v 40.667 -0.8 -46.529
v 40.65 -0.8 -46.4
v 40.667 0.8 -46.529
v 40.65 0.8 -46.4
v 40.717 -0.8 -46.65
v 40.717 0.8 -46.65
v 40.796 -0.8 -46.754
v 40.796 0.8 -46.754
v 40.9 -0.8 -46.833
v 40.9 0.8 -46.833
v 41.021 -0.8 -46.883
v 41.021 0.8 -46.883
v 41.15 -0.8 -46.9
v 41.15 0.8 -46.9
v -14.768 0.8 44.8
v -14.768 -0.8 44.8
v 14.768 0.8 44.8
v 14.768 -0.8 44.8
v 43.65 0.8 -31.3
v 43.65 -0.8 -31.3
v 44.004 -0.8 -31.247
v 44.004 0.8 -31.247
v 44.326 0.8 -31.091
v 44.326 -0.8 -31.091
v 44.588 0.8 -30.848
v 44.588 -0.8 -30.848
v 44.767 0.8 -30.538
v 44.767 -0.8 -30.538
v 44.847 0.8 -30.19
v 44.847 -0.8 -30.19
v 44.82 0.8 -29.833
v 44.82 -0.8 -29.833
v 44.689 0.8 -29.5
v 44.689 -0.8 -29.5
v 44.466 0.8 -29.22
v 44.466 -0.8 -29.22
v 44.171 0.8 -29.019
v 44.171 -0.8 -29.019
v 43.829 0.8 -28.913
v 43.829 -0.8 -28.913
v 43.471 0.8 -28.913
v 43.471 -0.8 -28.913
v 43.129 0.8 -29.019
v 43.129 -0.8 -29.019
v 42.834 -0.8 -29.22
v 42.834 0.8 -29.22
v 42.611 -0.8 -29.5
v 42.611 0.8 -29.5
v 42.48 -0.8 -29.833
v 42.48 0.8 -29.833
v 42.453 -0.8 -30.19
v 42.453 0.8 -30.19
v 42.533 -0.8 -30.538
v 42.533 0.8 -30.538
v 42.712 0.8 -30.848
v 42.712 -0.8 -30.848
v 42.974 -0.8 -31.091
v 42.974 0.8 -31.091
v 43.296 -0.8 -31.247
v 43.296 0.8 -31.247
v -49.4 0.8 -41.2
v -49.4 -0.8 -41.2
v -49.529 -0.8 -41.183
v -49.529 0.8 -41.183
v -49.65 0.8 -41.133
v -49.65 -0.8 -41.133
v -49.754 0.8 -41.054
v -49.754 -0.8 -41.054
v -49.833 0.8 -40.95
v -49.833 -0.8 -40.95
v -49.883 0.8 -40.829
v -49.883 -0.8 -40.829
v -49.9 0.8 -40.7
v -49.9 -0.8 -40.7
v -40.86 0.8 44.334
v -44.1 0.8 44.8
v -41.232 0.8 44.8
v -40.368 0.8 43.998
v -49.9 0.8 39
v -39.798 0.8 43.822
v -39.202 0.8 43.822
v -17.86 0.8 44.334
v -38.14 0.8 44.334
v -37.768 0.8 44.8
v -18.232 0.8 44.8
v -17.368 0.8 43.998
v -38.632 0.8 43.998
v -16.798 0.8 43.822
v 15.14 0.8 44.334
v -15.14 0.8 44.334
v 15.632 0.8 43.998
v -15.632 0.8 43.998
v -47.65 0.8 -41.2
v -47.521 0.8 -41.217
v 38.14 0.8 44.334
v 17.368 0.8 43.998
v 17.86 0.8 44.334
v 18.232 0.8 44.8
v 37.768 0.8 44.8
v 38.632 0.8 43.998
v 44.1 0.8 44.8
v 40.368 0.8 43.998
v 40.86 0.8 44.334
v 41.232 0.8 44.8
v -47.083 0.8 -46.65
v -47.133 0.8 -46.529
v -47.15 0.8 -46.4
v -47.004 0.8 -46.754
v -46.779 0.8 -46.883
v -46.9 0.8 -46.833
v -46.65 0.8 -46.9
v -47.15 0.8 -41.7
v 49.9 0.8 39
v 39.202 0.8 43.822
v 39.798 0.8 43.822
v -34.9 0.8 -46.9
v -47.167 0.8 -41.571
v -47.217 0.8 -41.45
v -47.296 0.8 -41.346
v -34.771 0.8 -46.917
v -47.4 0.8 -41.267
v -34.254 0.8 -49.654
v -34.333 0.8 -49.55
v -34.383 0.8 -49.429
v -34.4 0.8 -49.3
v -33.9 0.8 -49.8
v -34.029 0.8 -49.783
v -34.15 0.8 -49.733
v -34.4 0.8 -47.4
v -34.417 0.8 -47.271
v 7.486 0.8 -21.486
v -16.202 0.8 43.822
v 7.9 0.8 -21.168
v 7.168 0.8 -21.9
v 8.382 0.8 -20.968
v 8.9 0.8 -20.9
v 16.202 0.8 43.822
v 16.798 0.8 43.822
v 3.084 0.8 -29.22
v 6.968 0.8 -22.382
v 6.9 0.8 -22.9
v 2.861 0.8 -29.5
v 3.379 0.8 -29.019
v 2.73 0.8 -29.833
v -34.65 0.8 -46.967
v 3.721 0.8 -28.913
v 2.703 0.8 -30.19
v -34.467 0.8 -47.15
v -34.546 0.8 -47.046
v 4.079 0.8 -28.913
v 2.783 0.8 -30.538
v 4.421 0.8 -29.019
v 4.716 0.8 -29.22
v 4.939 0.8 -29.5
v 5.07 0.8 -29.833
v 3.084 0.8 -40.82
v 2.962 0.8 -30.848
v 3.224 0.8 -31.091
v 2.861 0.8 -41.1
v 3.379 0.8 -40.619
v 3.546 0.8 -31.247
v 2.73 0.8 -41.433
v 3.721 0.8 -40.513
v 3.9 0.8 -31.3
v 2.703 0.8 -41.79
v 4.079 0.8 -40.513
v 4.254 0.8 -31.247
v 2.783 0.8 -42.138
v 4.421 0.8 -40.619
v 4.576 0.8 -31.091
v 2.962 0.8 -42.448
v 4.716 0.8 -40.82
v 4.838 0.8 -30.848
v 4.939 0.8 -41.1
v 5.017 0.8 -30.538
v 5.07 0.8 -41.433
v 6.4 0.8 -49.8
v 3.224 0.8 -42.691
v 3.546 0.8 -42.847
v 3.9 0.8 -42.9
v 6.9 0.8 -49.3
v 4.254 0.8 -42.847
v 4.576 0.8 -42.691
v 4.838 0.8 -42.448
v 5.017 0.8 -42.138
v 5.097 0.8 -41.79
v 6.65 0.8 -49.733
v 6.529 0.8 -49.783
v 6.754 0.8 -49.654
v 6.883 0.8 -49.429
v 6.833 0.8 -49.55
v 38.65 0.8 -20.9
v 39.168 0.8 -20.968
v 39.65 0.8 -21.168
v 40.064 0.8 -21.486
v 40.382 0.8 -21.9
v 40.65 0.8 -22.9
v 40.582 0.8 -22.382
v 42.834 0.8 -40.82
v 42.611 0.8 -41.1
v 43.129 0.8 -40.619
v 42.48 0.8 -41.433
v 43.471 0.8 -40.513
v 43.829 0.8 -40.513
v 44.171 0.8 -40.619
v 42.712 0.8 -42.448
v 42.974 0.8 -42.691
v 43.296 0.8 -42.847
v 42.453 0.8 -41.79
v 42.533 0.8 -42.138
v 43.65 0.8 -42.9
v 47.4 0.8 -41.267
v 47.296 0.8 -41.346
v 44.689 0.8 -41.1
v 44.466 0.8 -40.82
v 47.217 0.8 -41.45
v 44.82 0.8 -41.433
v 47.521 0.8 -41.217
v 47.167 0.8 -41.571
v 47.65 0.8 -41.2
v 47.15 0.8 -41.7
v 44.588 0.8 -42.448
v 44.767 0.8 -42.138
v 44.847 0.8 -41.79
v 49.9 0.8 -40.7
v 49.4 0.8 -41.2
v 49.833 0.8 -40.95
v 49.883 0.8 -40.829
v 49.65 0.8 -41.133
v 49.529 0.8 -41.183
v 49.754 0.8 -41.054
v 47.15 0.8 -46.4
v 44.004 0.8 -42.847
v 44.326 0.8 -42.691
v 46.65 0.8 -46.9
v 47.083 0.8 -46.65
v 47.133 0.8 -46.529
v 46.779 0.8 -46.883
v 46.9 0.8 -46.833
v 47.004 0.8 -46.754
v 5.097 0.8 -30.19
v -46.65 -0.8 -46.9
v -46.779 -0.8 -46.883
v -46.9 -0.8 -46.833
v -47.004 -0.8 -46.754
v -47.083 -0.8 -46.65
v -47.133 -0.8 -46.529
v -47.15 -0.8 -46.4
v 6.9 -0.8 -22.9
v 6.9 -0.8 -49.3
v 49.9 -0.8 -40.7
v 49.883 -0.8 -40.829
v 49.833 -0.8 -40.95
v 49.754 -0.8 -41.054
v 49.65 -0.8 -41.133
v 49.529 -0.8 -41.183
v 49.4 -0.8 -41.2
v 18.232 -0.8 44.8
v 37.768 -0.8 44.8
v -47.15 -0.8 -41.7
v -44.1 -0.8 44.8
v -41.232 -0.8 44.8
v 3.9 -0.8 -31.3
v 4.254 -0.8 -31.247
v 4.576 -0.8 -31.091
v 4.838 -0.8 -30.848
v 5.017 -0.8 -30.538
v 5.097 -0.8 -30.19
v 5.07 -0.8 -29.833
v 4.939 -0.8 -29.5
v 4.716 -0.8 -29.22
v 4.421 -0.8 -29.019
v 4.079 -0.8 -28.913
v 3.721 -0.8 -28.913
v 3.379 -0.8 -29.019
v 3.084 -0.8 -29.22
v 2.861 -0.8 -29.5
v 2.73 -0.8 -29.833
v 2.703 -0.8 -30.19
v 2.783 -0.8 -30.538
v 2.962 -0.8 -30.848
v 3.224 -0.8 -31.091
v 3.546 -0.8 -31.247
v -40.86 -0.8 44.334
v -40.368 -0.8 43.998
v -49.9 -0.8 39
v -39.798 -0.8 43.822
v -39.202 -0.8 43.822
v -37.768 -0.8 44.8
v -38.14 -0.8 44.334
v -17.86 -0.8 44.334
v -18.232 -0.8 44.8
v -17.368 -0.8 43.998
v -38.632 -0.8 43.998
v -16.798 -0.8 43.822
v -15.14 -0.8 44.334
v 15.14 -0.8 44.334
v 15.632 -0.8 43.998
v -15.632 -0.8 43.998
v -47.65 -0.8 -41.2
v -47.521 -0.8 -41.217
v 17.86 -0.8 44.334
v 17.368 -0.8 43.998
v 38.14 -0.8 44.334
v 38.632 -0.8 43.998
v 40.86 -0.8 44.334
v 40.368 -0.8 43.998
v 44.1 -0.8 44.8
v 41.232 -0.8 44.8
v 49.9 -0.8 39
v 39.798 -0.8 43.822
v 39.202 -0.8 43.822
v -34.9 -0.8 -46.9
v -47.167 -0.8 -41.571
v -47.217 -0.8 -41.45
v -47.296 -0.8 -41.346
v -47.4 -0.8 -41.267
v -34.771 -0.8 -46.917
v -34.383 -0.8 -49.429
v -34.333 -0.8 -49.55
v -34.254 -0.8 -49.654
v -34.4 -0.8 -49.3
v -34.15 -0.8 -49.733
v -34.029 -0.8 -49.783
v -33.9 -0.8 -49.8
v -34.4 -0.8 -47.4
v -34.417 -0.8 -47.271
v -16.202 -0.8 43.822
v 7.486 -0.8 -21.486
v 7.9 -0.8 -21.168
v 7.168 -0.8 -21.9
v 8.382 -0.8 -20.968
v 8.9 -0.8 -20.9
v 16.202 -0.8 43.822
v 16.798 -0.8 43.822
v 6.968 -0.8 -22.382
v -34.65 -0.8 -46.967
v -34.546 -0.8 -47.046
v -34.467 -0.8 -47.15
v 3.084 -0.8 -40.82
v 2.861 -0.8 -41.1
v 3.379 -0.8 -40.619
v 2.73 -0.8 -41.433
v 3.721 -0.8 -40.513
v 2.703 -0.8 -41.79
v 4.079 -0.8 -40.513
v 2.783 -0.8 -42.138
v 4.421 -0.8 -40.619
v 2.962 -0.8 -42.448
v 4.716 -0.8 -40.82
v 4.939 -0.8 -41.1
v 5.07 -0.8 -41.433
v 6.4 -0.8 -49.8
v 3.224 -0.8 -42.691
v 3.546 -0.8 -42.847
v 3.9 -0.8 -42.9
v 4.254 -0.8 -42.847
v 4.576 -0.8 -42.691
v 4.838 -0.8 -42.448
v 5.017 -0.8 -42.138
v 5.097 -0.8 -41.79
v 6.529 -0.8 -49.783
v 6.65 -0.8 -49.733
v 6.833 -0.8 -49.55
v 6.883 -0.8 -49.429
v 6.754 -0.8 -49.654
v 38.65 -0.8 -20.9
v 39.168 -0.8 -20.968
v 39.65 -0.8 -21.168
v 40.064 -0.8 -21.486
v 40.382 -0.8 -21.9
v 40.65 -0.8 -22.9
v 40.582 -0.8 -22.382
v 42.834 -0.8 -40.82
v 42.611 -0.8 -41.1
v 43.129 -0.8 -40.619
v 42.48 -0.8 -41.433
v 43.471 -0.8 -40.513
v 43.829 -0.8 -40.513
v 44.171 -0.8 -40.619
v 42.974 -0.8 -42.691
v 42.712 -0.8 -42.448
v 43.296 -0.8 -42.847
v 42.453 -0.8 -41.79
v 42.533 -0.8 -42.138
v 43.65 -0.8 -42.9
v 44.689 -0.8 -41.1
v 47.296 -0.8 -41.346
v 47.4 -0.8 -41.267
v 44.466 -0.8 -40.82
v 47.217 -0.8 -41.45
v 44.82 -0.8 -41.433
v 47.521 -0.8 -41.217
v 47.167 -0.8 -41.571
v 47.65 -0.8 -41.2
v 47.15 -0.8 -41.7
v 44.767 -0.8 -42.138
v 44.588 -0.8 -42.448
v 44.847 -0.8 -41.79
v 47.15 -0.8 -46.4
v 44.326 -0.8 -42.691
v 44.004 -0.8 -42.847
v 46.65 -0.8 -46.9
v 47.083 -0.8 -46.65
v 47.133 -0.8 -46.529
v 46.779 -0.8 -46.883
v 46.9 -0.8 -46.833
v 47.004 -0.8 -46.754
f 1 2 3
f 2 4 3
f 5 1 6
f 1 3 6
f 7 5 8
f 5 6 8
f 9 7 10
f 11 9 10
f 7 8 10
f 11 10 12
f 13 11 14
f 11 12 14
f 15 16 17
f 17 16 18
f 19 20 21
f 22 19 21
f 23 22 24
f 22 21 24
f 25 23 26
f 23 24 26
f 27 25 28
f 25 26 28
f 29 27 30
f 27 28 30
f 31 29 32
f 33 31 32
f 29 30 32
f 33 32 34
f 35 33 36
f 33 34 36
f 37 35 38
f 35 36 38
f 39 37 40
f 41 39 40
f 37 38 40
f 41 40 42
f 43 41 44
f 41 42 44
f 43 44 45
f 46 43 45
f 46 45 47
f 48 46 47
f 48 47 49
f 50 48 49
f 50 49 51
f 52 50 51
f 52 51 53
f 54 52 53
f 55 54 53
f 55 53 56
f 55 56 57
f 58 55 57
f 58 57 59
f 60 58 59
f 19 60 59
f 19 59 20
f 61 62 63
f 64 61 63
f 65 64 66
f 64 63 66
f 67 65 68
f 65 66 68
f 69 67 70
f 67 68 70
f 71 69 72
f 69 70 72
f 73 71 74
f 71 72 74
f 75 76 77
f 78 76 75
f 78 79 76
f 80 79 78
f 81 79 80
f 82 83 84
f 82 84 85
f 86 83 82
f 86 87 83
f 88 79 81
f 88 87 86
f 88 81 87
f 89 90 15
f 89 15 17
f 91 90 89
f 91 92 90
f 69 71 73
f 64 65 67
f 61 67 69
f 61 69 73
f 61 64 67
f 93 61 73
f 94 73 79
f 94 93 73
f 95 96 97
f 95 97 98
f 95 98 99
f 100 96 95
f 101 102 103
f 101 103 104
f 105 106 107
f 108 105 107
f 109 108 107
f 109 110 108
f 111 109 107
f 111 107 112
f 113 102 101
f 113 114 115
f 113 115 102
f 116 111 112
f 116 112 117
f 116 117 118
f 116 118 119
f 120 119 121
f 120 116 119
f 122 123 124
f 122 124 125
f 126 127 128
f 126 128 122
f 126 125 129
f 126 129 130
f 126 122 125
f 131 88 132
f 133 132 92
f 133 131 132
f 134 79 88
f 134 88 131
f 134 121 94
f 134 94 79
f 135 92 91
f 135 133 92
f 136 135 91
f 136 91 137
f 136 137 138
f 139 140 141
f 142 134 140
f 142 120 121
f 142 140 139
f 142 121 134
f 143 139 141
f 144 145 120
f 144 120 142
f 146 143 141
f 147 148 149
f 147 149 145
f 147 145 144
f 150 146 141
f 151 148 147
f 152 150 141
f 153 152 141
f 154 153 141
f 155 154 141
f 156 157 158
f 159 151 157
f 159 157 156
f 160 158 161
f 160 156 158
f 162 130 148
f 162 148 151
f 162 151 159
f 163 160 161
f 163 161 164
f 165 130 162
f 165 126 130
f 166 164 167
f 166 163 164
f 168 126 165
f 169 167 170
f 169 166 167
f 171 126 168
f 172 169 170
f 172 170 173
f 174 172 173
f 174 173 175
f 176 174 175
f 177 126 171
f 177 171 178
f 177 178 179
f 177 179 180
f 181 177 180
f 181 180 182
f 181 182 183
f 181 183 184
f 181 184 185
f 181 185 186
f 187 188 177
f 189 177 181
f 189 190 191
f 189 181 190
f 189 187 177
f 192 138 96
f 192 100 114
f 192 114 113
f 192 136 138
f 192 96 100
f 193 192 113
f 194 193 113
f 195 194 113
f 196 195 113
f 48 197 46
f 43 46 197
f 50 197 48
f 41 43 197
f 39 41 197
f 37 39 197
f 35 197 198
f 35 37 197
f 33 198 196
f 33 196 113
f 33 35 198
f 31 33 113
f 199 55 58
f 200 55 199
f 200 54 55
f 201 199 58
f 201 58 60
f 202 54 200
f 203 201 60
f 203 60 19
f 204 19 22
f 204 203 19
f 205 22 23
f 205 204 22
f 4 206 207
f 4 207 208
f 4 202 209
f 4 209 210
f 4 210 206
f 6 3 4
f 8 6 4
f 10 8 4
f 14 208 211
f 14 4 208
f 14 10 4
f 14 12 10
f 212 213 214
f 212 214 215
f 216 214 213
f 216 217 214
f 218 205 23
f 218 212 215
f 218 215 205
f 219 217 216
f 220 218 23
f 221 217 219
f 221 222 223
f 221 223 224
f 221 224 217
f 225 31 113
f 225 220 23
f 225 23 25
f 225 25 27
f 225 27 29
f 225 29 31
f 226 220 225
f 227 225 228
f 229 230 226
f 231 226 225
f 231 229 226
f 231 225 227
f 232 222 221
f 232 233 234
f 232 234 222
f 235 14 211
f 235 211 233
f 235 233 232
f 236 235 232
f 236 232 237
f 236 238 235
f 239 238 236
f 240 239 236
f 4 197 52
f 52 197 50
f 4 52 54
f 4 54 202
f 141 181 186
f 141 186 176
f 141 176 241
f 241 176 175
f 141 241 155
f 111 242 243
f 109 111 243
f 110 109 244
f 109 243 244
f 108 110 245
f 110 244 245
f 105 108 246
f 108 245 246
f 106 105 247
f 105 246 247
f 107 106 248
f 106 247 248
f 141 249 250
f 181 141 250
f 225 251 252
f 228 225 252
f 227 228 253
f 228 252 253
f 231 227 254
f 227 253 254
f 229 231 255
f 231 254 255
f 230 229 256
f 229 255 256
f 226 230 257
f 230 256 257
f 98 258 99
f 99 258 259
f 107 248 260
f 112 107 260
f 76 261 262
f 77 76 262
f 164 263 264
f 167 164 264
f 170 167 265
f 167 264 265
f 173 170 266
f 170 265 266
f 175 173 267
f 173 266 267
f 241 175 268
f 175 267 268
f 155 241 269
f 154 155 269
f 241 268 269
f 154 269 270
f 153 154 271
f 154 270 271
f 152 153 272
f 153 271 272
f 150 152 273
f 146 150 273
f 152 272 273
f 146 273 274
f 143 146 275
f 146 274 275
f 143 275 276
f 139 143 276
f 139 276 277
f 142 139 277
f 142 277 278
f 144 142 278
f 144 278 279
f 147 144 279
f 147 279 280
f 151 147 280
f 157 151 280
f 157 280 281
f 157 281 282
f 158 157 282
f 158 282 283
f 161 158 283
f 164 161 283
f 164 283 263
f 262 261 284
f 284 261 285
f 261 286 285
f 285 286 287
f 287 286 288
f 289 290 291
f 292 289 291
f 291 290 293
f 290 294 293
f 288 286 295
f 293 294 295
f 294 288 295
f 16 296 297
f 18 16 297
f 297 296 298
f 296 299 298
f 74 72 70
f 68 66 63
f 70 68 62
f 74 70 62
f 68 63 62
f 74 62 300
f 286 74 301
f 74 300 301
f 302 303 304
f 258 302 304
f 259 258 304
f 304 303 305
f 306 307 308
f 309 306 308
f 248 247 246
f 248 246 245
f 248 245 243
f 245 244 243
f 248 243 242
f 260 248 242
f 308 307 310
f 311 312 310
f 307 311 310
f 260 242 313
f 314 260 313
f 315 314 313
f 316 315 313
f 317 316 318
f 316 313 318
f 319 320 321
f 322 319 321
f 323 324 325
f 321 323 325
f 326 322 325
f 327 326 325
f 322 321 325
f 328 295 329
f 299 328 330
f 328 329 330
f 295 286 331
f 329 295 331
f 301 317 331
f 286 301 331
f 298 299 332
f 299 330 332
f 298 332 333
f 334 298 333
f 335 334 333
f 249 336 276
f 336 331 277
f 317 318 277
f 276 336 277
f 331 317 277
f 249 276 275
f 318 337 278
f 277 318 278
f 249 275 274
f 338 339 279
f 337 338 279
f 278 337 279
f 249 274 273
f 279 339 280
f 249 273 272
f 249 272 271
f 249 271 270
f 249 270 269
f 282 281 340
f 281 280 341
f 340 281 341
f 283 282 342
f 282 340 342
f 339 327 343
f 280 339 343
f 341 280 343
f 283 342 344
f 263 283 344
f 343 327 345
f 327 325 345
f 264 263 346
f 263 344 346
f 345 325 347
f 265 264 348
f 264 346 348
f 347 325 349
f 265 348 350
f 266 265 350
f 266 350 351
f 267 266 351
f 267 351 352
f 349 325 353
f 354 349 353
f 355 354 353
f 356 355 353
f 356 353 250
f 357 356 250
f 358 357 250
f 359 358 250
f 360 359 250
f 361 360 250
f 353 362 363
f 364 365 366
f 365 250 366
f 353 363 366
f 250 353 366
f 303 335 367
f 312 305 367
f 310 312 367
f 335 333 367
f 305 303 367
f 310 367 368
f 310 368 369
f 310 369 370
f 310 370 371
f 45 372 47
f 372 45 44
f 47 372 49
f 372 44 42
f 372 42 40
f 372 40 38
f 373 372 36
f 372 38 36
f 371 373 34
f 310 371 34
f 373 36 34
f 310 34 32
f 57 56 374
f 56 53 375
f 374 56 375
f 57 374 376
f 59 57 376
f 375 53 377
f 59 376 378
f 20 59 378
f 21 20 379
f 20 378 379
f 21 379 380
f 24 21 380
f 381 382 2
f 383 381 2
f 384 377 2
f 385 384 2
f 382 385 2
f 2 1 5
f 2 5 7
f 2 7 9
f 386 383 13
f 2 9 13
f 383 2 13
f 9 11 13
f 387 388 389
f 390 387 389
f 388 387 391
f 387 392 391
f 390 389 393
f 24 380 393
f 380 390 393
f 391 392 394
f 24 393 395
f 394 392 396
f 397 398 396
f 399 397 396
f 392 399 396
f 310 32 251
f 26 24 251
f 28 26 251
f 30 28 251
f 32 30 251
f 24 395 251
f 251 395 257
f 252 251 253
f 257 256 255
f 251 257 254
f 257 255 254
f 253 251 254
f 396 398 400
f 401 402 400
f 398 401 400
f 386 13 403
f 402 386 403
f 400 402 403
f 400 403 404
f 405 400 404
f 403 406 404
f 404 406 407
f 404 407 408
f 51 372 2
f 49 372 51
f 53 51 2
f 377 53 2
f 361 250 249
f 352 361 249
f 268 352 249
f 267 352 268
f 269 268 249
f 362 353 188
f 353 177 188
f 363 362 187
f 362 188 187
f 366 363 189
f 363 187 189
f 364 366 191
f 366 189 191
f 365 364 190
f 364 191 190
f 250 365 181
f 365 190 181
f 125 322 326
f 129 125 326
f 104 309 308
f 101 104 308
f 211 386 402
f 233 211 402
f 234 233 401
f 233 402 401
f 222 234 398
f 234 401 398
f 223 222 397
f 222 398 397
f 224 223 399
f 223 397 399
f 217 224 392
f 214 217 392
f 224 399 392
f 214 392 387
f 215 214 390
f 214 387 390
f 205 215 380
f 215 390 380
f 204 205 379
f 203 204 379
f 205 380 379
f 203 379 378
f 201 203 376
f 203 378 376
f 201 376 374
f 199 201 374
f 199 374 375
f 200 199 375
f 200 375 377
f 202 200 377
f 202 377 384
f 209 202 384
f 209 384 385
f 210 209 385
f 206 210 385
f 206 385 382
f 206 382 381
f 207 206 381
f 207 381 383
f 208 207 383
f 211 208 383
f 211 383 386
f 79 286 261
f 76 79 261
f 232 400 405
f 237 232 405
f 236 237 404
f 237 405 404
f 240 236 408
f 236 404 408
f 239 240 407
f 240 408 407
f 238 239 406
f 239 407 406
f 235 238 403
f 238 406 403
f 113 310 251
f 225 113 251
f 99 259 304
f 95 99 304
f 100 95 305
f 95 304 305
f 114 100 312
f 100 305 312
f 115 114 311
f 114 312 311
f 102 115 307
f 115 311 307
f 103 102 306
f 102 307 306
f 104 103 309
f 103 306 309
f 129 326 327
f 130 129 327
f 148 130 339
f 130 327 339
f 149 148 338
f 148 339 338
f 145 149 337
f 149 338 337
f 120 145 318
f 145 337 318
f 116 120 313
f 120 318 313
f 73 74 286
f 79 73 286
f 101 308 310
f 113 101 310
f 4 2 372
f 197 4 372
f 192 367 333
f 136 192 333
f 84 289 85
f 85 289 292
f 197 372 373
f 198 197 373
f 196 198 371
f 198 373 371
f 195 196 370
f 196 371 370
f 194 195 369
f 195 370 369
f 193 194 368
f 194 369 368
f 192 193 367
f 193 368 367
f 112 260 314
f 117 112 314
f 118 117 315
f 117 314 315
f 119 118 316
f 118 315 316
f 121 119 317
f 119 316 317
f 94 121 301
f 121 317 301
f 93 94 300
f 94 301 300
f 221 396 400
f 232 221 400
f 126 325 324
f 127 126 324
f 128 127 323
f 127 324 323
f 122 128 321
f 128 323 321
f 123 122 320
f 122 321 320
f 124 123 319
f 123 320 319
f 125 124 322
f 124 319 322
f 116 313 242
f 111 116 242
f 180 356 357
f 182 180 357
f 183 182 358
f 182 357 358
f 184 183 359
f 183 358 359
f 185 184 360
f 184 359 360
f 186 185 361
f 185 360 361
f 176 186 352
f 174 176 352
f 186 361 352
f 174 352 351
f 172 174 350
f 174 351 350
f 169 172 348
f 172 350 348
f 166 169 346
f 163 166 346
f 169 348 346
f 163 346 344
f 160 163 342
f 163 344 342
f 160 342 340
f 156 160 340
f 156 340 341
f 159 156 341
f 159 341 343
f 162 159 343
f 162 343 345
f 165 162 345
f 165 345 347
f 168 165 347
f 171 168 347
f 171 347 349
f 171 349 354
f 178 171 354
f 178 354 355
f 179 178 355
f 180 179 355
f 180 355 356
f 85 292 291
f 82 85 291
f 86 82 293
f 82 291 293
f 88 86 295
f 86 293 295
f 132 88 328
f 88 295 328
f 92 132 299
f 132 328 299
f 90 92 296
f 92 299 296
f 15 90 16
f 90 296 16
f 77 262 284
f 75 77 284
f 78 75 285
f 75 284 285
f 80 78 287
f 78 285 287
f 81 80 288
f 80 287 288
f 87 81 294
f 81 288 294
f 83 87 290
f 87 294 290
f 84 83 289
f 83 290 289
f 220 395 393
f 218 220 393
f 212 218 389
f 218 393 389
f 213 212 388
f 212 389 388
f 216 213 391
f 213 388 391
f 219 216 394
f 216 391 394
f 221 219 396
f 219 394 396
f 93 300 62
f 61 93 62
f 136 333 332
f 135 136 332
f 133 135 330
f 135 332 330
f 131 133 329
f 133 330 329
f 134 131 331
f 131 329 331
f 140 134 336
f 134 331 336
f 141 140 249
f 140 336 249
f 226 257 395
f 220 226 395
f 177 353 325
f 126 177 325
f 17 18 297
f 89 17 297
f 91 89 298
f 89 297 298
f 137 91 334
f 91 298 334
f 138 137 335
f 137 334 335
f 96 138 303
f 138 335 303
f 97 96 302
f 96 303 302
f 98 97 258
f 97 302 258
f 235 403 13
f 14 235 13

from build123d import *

# Parameters (mm, degrees)
GENERICCARDPCBDEFINITION_START = -0.8
GENERICCARDPCBDEFINITION_DEPTH = 1.6
SKETCH7_R                      = 1.2
CUT_EXTRUDE1_DEPTH             = 71.516735602
FILLET1_R                      = 0.5


# Read off the part's stored shape, not the designer's step: GenericCardPCBDefinition
with BuildPart() as part:
    # GenericCardPCBDefinition outline → GenericCardPCBDefinition (new body)
    with BuildSketch(Plane(origin=(0, 0, 0), x_dir=(1, 0, 0), z_dir=(0, 1, 0)).offset(GENERICCARDPCBDEFINITION_START)):
        with BuildLine():
            Line((-49.9, -39), (-44.1, -44.8))
            Line((-44.1, -44.8), (-41.232050808, -44.8))
            ThreePointArc((-41.232050808, -44.8), (-39.5, -43.8), (-37.767949192, -44.8))
            Line((-37.767949192, -44.8), (-18.232050808, -44.8))
            ThreePointArc((-18.232050808, -44.8), (-16.5, -43.8), (-14.767949192, -44.8))
            Line((-14.767949192, -44.8), (14.767949192, -44.8))
            ThreePointArc((14.767949192, -44.8), (16.5, -43.8), (18.232050808, -44.8))
            Line((18.232050808, -44.8), (37.767949192, -44.8))
            ThreePointArc((37.767949192, -44.8), (39.5, -43.8), (41.232050808, -44.8))
            Line((41.232050808, -44.8), (44.1, -44.8))
            Line((44.1, -44.8), (49.9, -39))
            Line((49.9, -39), (49.9, 40.7))
            ThreePointArc((49.9, 40.7), (49.753553391, 41.053553391), (49.4, 41.2))
            Line((49.4, 41.2), (47.65, 41.2))
            ThreePointArc((47.65, 41.2), (47.296446609, 41.346446609), (47.15, 41.7))
            Line((47.15, 41.7), (47.15, 46.4))
            ThreePointArc((47.15, 46.4), (47.003553391, 46.753553391), (46.65, 46.9))
            Line((46.65, 46.9), (34.9, 46.9))
            ThreePointArc((34.9, 46.9), (34.546446609, 47.046446609), (34.4, 47.4))
            Line((34.4, 47.4), (34.4, 49.3))
            ThreePointArc((34.4, 49.3), (34.253553391, 49.653553391), (33.9, 49.8))
            Line((33.9, 49.8), (-33.9, 49.8))
            ThreePointArc((-33.9, 49.8), (-34.253553391, 49.653553391), (-34.4, 49.3))
            Line((-34.4, 49.3), (-34.4, 47.4))
            ThreePointArc((-34.4, 47.4), (-34.546446609, 47.046446609), (-34.9, 46.9))
            Line((-34.9, 46.9), (-46.65, 46.9))
            ThreePointArc((-46.65, 46.9), (-47.003553391, 46.753553391), (-47.15, 46.4))
            Line((-47.15, 46.4), (-47.15, 41.7))
            ThreePointArc((-47.15, 41.7), (-47.296446609, 41.346446609), (-47.65, 41.2))
            Line((-47.65, 41.2), (-49.4, 41.2))
            ThreePointArc((-49.4, 41.2), (-49.753553391, 41.053553391), (-49.9, 40.7))
            Line((-49.9, 40.7), (-49.9, -39))
        make_face()
    extrude(amount=GENERICCARDPCBDEFINITION_DEPTH)

    # Sketch7 → Cut-Extrude1 (cut, through all)
    with BuildSketch(Plane.XZ.offset(0.8)):
        with Locations(Location((3.9, -41.7, 0), (0, 0, 270))):
            Circle(SKETCH7_R)
        with Locations(Location((3.9, -30.1, 0), (0, 0, 270))):
            Circle(SKETCH7_R)
        with Locations(Location((43.65, -41.7, 0), (0, 0, 270))):
            Circle(SKETCH7_R)
        with Locations(Location((43.65, -30.1, 0), (0, 0, 270))):
            Circle(SKETCH7_R)
        with BuildLine():
            Line((38.65, -20.9), (8.9, -20.9))
            ThreePointArc((8.9, -20.9), (7.485786438, -21.485786438), (6.9, -22.9))
            Line((6.9, -22.9), (6.9, -49.8))
            Line((6.9, -49.8), (40.65, -49.8))
            Line((40.65, -49.8), (40.65, -22.9))
            ThreePointArc((40.65, -22.9), (40.064213562, -21.485786438), (38.65, -20.9))
        make_face()
    extrude(amount=-CUT_EXTRUDE1_DEPTH, mode=Mode.SUBTRACT)

    # Fillet1
    fillet1_edges = [part.edges().sort_by_distance(p)[0] for p in [
        (40.65, 0, -46.9),
        (6.9, 0, -49.8),
    ]]
    fillet(fillet1_edges, radius=FILLET1_R)


solid = part.part
